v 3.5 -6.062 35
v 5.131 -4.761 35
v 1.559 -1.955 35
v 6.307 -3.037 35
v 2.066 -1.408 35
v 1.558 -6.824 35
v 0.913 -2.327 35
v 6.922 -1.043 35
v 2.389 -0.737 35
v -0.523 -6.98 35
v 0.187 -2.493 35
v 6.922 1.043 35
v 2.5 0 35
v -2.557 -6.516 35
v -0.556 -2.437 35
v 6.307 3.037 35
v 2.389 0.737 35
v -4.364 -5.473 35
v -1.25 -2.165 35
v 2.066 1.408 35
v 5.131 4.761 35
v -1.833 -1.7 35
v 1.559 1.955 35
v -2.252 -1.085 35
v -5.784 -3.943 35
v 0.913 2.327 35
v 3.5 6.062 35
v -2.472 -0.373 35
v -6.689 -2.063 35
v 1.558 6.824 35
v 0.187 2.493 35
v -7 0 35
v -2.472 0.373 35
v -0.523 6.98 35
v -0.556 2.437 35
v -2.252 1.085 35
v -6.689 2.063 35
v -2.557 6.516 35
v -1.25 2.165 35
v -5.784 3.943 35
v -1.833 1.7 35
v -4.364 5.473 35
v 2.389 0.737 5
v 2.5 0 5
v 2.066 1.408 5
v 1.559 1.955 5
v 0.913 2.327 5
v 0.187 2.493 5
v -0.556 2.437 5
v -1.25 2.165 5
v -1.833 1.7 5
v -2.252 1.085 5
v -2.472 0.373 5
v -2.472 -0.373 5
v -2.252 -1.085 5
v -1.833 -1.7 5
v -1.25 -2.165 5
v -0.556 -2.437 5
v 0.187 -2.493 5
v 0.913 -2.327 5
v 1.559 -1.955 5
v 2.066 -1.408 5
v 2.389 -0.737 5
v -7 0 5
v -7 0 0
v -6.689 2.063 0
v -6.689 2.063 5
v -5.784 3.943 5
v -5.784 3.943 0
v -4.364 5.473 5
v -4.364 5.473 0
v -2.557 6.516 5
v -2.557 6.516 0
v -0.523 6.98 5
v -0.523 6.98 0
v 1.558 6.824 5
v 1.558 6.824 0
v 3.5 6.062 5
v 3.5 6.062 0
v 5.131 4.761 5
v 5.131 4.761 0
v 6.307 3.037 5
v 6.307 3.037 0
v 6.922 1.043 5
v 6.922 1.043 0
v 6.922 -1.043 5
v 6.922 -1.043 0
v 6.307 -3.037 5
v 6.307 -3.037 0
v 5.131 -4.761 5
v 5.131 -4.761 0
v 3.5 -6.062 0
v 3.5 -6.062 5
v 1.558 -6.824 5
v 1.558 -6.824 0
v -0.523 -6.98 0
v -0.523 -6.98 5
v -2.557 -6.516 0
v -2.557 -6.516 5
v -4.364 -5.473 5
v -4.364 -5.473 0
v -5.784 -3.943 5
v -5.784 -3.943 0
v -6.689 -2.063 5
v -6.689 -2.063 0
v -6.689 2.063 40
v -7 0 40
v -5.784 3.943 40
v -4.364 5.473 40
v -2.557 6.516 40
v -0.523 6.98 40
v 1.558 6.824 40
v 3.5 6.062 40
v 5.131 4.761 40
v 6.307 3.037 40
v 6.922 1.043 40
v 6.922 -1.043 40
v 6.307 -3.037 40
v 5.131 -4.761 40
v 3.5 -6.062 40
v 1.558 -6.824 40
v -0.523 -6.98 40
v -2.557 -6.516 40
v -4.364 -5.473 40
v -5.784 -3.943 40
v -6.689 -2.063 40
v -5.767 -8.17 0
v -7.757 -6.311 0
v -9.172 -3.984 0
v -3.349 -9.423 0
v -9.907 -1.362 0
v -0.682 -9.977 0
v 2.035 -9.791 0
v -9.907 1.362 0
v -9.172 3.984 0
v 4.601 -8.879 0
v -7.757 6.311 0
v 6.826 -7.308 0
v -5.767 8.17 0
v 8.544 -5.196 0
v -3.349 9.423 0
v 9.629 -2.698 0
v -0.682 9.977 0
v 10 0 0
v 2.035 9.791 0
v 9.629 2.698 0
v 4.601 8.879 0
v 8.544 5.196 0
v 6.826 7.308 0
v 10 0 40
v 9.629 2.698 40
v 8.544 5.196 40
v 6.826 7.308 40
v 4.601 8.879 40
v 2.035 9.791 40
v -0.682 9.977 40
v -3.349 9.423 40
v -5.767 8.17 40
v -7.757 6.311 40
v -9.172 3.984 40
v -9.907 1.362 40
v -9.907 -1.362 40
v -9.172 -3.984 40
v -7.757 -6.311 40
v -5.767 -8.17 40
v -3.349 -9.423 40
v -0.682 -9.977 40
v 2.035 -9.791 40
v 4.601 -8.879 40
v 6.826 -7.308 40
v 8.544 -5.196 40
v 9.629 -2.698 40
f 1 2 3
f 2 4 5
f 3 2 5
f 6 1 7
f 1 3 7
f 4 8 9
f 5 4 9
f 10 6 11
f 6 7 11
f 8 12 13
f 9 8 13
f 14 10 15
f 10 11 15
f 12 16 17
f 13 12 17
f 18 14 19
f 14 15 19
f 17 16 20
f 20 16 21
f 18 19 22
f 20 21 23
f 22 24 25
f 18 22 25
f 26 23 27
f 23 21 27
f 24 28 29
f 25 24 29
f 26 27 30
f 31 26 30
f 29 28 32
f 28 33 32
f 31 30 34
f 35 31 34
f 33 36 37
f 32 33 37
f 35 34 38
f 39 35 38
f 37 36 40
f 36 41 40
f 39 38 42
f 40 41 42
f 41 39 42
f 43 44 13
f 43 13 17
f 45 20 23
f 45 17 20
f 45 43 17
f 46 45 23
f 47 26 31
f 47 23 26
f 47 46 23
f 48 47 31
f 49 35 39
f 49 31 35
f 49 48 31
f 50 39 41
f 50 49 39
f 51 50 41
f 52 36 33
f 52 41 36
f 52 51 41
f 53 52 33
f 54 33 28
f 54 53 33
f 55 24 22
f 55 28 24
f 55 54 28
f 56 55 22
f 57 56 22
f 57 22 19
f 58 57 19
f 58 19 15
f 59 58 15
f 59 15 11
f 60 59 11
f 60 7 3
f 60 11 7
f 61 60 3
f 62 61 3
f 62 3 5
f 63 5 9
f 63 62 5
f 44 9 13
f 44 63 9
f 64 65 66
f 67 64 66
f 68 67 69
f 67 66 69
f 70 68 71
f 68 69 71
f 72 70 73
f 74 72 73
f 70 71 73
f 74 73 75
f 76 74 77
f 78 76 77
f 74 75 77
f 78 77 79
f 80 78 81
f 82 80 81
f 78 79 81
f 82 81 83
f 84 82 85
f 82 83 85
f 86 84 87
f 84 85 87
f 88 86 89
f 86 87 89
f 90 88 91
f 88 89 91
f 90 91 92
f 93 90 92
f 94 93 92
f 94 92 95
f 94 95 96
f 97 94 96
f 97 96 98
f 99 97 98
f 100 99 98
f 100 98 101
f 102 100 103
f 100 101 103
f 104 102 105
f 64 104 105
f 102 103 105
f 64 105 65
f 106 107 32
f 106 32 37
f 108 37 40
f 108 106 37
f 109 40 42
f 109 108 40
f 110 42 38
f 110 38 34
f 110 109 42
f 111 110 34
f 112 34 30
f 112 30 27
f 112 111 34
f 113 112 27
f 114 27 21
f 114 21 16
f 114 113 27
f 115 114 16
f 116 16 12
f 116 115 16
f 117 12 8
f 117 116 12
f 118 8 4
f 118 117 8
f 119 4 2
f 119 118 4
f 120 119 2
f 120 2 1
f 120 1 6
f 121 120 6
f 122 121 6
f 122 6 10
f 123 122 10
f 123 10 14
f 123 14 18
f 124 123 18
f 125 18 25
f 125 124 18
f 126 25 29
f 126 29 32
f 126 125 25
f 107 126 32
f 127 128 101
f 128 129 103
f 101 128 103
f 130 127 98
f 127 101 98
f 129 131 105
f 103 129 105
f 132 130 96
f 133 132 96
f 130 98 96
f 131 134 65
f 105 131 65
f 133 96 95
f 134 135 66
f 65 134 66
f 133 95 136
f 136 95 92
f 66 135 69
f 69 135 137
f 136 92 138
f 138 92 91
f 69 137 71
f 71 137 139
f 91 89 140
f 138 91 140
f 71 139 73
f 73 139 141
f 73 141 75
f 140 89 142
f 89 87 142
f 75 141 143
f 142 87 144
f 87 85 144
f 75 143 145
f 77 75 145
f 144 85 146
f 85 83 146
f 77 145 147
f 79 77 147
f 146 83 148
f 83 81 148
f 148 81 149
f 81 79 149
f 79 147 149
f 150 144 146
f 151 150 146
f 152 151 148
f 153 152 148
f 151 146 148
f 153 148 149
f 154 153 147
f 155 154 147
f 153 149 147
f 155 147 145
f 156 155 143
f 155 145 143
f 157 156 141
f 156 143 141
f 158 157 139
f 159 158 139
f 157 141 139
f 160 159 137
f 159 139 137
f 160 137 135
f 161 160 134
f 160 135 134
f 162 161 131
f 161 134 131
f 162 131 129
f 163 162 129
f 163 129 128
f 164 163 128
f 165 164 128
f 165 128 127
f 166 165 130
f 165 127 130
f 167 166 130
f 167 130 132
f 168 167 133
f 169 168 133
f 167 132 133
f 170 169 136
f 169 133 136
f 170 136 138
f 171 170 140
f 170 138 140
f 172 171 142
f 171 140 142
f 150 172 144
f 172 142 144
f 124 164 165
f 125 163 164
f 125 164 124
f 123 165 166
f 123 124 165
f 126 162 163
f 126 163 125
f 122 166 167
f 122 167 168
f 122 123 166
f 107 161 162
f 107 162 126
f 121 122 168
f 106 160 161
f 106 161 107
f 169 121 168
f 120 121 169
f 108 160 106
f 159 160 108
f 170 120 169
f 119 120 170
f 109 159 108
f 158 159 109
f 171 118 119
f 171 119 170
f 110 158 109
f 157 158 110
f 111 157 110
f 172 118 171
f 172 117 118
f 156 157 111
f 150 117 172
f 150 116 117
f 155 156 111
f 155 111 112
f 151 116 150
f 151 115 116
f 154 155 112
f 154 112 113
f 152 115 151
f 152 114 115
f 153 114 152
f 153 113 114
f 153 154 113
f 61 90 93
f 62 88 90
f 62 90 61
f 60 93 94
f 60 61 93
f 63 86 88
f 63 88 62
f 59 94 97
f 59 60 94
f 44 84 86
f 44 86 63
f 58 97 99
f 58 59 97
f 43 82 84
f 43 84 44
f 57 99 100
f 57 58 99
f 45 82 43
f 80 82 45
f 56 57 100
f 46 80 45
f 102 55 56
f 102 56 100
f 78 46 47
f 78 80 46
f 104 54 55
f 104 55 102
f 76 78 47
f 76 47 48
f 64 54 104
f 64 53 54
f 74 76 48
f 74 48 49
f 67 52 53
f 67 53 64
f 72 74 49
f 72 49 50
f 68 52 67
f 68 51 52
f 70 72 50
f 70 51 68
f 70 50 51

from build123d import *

# Parameters (mm, degrees)
SKETCH_1_R          = 10
SKETCH_1_R_2        = 2.5
EXTRUDE_1_DEPTH     = 40
SKETCH_2_R          = 7
CUT_EXTRUDE_1_DEPTH = 5


with BuildPart() as part:
    # 草图1 → 凸台-拉伸1 (new body)
    with BuildSketch(Plane.XY):
        Circle(SKETCH_1_R)
        Circle(SKETCH_1_R_2, mode=Mode.SUBTRACT)
    extrude(amount=EXTRUDE_1_DEPTH)

    # 草图2 → 切除-拉伸1 (cut)
    with BuildSketch(Plane(origin=(0, 0, 0), x_dir=(-1, 0, 0), z_dir=(0, 0, -1))):
        Circle(SKETCH_2_R)
    cut_extrude_1 = extrude(amount=-CUT_EXTRUDE_1_DEPTH, mode=Mode.SUBTRACT)

    # 镜向1: 切除-拉伸1 across plane
    add(cut_extrude_1.mirror(Plane.XY.offset(20)), mode=Mode.SUBTRACT)


solid = part.part
